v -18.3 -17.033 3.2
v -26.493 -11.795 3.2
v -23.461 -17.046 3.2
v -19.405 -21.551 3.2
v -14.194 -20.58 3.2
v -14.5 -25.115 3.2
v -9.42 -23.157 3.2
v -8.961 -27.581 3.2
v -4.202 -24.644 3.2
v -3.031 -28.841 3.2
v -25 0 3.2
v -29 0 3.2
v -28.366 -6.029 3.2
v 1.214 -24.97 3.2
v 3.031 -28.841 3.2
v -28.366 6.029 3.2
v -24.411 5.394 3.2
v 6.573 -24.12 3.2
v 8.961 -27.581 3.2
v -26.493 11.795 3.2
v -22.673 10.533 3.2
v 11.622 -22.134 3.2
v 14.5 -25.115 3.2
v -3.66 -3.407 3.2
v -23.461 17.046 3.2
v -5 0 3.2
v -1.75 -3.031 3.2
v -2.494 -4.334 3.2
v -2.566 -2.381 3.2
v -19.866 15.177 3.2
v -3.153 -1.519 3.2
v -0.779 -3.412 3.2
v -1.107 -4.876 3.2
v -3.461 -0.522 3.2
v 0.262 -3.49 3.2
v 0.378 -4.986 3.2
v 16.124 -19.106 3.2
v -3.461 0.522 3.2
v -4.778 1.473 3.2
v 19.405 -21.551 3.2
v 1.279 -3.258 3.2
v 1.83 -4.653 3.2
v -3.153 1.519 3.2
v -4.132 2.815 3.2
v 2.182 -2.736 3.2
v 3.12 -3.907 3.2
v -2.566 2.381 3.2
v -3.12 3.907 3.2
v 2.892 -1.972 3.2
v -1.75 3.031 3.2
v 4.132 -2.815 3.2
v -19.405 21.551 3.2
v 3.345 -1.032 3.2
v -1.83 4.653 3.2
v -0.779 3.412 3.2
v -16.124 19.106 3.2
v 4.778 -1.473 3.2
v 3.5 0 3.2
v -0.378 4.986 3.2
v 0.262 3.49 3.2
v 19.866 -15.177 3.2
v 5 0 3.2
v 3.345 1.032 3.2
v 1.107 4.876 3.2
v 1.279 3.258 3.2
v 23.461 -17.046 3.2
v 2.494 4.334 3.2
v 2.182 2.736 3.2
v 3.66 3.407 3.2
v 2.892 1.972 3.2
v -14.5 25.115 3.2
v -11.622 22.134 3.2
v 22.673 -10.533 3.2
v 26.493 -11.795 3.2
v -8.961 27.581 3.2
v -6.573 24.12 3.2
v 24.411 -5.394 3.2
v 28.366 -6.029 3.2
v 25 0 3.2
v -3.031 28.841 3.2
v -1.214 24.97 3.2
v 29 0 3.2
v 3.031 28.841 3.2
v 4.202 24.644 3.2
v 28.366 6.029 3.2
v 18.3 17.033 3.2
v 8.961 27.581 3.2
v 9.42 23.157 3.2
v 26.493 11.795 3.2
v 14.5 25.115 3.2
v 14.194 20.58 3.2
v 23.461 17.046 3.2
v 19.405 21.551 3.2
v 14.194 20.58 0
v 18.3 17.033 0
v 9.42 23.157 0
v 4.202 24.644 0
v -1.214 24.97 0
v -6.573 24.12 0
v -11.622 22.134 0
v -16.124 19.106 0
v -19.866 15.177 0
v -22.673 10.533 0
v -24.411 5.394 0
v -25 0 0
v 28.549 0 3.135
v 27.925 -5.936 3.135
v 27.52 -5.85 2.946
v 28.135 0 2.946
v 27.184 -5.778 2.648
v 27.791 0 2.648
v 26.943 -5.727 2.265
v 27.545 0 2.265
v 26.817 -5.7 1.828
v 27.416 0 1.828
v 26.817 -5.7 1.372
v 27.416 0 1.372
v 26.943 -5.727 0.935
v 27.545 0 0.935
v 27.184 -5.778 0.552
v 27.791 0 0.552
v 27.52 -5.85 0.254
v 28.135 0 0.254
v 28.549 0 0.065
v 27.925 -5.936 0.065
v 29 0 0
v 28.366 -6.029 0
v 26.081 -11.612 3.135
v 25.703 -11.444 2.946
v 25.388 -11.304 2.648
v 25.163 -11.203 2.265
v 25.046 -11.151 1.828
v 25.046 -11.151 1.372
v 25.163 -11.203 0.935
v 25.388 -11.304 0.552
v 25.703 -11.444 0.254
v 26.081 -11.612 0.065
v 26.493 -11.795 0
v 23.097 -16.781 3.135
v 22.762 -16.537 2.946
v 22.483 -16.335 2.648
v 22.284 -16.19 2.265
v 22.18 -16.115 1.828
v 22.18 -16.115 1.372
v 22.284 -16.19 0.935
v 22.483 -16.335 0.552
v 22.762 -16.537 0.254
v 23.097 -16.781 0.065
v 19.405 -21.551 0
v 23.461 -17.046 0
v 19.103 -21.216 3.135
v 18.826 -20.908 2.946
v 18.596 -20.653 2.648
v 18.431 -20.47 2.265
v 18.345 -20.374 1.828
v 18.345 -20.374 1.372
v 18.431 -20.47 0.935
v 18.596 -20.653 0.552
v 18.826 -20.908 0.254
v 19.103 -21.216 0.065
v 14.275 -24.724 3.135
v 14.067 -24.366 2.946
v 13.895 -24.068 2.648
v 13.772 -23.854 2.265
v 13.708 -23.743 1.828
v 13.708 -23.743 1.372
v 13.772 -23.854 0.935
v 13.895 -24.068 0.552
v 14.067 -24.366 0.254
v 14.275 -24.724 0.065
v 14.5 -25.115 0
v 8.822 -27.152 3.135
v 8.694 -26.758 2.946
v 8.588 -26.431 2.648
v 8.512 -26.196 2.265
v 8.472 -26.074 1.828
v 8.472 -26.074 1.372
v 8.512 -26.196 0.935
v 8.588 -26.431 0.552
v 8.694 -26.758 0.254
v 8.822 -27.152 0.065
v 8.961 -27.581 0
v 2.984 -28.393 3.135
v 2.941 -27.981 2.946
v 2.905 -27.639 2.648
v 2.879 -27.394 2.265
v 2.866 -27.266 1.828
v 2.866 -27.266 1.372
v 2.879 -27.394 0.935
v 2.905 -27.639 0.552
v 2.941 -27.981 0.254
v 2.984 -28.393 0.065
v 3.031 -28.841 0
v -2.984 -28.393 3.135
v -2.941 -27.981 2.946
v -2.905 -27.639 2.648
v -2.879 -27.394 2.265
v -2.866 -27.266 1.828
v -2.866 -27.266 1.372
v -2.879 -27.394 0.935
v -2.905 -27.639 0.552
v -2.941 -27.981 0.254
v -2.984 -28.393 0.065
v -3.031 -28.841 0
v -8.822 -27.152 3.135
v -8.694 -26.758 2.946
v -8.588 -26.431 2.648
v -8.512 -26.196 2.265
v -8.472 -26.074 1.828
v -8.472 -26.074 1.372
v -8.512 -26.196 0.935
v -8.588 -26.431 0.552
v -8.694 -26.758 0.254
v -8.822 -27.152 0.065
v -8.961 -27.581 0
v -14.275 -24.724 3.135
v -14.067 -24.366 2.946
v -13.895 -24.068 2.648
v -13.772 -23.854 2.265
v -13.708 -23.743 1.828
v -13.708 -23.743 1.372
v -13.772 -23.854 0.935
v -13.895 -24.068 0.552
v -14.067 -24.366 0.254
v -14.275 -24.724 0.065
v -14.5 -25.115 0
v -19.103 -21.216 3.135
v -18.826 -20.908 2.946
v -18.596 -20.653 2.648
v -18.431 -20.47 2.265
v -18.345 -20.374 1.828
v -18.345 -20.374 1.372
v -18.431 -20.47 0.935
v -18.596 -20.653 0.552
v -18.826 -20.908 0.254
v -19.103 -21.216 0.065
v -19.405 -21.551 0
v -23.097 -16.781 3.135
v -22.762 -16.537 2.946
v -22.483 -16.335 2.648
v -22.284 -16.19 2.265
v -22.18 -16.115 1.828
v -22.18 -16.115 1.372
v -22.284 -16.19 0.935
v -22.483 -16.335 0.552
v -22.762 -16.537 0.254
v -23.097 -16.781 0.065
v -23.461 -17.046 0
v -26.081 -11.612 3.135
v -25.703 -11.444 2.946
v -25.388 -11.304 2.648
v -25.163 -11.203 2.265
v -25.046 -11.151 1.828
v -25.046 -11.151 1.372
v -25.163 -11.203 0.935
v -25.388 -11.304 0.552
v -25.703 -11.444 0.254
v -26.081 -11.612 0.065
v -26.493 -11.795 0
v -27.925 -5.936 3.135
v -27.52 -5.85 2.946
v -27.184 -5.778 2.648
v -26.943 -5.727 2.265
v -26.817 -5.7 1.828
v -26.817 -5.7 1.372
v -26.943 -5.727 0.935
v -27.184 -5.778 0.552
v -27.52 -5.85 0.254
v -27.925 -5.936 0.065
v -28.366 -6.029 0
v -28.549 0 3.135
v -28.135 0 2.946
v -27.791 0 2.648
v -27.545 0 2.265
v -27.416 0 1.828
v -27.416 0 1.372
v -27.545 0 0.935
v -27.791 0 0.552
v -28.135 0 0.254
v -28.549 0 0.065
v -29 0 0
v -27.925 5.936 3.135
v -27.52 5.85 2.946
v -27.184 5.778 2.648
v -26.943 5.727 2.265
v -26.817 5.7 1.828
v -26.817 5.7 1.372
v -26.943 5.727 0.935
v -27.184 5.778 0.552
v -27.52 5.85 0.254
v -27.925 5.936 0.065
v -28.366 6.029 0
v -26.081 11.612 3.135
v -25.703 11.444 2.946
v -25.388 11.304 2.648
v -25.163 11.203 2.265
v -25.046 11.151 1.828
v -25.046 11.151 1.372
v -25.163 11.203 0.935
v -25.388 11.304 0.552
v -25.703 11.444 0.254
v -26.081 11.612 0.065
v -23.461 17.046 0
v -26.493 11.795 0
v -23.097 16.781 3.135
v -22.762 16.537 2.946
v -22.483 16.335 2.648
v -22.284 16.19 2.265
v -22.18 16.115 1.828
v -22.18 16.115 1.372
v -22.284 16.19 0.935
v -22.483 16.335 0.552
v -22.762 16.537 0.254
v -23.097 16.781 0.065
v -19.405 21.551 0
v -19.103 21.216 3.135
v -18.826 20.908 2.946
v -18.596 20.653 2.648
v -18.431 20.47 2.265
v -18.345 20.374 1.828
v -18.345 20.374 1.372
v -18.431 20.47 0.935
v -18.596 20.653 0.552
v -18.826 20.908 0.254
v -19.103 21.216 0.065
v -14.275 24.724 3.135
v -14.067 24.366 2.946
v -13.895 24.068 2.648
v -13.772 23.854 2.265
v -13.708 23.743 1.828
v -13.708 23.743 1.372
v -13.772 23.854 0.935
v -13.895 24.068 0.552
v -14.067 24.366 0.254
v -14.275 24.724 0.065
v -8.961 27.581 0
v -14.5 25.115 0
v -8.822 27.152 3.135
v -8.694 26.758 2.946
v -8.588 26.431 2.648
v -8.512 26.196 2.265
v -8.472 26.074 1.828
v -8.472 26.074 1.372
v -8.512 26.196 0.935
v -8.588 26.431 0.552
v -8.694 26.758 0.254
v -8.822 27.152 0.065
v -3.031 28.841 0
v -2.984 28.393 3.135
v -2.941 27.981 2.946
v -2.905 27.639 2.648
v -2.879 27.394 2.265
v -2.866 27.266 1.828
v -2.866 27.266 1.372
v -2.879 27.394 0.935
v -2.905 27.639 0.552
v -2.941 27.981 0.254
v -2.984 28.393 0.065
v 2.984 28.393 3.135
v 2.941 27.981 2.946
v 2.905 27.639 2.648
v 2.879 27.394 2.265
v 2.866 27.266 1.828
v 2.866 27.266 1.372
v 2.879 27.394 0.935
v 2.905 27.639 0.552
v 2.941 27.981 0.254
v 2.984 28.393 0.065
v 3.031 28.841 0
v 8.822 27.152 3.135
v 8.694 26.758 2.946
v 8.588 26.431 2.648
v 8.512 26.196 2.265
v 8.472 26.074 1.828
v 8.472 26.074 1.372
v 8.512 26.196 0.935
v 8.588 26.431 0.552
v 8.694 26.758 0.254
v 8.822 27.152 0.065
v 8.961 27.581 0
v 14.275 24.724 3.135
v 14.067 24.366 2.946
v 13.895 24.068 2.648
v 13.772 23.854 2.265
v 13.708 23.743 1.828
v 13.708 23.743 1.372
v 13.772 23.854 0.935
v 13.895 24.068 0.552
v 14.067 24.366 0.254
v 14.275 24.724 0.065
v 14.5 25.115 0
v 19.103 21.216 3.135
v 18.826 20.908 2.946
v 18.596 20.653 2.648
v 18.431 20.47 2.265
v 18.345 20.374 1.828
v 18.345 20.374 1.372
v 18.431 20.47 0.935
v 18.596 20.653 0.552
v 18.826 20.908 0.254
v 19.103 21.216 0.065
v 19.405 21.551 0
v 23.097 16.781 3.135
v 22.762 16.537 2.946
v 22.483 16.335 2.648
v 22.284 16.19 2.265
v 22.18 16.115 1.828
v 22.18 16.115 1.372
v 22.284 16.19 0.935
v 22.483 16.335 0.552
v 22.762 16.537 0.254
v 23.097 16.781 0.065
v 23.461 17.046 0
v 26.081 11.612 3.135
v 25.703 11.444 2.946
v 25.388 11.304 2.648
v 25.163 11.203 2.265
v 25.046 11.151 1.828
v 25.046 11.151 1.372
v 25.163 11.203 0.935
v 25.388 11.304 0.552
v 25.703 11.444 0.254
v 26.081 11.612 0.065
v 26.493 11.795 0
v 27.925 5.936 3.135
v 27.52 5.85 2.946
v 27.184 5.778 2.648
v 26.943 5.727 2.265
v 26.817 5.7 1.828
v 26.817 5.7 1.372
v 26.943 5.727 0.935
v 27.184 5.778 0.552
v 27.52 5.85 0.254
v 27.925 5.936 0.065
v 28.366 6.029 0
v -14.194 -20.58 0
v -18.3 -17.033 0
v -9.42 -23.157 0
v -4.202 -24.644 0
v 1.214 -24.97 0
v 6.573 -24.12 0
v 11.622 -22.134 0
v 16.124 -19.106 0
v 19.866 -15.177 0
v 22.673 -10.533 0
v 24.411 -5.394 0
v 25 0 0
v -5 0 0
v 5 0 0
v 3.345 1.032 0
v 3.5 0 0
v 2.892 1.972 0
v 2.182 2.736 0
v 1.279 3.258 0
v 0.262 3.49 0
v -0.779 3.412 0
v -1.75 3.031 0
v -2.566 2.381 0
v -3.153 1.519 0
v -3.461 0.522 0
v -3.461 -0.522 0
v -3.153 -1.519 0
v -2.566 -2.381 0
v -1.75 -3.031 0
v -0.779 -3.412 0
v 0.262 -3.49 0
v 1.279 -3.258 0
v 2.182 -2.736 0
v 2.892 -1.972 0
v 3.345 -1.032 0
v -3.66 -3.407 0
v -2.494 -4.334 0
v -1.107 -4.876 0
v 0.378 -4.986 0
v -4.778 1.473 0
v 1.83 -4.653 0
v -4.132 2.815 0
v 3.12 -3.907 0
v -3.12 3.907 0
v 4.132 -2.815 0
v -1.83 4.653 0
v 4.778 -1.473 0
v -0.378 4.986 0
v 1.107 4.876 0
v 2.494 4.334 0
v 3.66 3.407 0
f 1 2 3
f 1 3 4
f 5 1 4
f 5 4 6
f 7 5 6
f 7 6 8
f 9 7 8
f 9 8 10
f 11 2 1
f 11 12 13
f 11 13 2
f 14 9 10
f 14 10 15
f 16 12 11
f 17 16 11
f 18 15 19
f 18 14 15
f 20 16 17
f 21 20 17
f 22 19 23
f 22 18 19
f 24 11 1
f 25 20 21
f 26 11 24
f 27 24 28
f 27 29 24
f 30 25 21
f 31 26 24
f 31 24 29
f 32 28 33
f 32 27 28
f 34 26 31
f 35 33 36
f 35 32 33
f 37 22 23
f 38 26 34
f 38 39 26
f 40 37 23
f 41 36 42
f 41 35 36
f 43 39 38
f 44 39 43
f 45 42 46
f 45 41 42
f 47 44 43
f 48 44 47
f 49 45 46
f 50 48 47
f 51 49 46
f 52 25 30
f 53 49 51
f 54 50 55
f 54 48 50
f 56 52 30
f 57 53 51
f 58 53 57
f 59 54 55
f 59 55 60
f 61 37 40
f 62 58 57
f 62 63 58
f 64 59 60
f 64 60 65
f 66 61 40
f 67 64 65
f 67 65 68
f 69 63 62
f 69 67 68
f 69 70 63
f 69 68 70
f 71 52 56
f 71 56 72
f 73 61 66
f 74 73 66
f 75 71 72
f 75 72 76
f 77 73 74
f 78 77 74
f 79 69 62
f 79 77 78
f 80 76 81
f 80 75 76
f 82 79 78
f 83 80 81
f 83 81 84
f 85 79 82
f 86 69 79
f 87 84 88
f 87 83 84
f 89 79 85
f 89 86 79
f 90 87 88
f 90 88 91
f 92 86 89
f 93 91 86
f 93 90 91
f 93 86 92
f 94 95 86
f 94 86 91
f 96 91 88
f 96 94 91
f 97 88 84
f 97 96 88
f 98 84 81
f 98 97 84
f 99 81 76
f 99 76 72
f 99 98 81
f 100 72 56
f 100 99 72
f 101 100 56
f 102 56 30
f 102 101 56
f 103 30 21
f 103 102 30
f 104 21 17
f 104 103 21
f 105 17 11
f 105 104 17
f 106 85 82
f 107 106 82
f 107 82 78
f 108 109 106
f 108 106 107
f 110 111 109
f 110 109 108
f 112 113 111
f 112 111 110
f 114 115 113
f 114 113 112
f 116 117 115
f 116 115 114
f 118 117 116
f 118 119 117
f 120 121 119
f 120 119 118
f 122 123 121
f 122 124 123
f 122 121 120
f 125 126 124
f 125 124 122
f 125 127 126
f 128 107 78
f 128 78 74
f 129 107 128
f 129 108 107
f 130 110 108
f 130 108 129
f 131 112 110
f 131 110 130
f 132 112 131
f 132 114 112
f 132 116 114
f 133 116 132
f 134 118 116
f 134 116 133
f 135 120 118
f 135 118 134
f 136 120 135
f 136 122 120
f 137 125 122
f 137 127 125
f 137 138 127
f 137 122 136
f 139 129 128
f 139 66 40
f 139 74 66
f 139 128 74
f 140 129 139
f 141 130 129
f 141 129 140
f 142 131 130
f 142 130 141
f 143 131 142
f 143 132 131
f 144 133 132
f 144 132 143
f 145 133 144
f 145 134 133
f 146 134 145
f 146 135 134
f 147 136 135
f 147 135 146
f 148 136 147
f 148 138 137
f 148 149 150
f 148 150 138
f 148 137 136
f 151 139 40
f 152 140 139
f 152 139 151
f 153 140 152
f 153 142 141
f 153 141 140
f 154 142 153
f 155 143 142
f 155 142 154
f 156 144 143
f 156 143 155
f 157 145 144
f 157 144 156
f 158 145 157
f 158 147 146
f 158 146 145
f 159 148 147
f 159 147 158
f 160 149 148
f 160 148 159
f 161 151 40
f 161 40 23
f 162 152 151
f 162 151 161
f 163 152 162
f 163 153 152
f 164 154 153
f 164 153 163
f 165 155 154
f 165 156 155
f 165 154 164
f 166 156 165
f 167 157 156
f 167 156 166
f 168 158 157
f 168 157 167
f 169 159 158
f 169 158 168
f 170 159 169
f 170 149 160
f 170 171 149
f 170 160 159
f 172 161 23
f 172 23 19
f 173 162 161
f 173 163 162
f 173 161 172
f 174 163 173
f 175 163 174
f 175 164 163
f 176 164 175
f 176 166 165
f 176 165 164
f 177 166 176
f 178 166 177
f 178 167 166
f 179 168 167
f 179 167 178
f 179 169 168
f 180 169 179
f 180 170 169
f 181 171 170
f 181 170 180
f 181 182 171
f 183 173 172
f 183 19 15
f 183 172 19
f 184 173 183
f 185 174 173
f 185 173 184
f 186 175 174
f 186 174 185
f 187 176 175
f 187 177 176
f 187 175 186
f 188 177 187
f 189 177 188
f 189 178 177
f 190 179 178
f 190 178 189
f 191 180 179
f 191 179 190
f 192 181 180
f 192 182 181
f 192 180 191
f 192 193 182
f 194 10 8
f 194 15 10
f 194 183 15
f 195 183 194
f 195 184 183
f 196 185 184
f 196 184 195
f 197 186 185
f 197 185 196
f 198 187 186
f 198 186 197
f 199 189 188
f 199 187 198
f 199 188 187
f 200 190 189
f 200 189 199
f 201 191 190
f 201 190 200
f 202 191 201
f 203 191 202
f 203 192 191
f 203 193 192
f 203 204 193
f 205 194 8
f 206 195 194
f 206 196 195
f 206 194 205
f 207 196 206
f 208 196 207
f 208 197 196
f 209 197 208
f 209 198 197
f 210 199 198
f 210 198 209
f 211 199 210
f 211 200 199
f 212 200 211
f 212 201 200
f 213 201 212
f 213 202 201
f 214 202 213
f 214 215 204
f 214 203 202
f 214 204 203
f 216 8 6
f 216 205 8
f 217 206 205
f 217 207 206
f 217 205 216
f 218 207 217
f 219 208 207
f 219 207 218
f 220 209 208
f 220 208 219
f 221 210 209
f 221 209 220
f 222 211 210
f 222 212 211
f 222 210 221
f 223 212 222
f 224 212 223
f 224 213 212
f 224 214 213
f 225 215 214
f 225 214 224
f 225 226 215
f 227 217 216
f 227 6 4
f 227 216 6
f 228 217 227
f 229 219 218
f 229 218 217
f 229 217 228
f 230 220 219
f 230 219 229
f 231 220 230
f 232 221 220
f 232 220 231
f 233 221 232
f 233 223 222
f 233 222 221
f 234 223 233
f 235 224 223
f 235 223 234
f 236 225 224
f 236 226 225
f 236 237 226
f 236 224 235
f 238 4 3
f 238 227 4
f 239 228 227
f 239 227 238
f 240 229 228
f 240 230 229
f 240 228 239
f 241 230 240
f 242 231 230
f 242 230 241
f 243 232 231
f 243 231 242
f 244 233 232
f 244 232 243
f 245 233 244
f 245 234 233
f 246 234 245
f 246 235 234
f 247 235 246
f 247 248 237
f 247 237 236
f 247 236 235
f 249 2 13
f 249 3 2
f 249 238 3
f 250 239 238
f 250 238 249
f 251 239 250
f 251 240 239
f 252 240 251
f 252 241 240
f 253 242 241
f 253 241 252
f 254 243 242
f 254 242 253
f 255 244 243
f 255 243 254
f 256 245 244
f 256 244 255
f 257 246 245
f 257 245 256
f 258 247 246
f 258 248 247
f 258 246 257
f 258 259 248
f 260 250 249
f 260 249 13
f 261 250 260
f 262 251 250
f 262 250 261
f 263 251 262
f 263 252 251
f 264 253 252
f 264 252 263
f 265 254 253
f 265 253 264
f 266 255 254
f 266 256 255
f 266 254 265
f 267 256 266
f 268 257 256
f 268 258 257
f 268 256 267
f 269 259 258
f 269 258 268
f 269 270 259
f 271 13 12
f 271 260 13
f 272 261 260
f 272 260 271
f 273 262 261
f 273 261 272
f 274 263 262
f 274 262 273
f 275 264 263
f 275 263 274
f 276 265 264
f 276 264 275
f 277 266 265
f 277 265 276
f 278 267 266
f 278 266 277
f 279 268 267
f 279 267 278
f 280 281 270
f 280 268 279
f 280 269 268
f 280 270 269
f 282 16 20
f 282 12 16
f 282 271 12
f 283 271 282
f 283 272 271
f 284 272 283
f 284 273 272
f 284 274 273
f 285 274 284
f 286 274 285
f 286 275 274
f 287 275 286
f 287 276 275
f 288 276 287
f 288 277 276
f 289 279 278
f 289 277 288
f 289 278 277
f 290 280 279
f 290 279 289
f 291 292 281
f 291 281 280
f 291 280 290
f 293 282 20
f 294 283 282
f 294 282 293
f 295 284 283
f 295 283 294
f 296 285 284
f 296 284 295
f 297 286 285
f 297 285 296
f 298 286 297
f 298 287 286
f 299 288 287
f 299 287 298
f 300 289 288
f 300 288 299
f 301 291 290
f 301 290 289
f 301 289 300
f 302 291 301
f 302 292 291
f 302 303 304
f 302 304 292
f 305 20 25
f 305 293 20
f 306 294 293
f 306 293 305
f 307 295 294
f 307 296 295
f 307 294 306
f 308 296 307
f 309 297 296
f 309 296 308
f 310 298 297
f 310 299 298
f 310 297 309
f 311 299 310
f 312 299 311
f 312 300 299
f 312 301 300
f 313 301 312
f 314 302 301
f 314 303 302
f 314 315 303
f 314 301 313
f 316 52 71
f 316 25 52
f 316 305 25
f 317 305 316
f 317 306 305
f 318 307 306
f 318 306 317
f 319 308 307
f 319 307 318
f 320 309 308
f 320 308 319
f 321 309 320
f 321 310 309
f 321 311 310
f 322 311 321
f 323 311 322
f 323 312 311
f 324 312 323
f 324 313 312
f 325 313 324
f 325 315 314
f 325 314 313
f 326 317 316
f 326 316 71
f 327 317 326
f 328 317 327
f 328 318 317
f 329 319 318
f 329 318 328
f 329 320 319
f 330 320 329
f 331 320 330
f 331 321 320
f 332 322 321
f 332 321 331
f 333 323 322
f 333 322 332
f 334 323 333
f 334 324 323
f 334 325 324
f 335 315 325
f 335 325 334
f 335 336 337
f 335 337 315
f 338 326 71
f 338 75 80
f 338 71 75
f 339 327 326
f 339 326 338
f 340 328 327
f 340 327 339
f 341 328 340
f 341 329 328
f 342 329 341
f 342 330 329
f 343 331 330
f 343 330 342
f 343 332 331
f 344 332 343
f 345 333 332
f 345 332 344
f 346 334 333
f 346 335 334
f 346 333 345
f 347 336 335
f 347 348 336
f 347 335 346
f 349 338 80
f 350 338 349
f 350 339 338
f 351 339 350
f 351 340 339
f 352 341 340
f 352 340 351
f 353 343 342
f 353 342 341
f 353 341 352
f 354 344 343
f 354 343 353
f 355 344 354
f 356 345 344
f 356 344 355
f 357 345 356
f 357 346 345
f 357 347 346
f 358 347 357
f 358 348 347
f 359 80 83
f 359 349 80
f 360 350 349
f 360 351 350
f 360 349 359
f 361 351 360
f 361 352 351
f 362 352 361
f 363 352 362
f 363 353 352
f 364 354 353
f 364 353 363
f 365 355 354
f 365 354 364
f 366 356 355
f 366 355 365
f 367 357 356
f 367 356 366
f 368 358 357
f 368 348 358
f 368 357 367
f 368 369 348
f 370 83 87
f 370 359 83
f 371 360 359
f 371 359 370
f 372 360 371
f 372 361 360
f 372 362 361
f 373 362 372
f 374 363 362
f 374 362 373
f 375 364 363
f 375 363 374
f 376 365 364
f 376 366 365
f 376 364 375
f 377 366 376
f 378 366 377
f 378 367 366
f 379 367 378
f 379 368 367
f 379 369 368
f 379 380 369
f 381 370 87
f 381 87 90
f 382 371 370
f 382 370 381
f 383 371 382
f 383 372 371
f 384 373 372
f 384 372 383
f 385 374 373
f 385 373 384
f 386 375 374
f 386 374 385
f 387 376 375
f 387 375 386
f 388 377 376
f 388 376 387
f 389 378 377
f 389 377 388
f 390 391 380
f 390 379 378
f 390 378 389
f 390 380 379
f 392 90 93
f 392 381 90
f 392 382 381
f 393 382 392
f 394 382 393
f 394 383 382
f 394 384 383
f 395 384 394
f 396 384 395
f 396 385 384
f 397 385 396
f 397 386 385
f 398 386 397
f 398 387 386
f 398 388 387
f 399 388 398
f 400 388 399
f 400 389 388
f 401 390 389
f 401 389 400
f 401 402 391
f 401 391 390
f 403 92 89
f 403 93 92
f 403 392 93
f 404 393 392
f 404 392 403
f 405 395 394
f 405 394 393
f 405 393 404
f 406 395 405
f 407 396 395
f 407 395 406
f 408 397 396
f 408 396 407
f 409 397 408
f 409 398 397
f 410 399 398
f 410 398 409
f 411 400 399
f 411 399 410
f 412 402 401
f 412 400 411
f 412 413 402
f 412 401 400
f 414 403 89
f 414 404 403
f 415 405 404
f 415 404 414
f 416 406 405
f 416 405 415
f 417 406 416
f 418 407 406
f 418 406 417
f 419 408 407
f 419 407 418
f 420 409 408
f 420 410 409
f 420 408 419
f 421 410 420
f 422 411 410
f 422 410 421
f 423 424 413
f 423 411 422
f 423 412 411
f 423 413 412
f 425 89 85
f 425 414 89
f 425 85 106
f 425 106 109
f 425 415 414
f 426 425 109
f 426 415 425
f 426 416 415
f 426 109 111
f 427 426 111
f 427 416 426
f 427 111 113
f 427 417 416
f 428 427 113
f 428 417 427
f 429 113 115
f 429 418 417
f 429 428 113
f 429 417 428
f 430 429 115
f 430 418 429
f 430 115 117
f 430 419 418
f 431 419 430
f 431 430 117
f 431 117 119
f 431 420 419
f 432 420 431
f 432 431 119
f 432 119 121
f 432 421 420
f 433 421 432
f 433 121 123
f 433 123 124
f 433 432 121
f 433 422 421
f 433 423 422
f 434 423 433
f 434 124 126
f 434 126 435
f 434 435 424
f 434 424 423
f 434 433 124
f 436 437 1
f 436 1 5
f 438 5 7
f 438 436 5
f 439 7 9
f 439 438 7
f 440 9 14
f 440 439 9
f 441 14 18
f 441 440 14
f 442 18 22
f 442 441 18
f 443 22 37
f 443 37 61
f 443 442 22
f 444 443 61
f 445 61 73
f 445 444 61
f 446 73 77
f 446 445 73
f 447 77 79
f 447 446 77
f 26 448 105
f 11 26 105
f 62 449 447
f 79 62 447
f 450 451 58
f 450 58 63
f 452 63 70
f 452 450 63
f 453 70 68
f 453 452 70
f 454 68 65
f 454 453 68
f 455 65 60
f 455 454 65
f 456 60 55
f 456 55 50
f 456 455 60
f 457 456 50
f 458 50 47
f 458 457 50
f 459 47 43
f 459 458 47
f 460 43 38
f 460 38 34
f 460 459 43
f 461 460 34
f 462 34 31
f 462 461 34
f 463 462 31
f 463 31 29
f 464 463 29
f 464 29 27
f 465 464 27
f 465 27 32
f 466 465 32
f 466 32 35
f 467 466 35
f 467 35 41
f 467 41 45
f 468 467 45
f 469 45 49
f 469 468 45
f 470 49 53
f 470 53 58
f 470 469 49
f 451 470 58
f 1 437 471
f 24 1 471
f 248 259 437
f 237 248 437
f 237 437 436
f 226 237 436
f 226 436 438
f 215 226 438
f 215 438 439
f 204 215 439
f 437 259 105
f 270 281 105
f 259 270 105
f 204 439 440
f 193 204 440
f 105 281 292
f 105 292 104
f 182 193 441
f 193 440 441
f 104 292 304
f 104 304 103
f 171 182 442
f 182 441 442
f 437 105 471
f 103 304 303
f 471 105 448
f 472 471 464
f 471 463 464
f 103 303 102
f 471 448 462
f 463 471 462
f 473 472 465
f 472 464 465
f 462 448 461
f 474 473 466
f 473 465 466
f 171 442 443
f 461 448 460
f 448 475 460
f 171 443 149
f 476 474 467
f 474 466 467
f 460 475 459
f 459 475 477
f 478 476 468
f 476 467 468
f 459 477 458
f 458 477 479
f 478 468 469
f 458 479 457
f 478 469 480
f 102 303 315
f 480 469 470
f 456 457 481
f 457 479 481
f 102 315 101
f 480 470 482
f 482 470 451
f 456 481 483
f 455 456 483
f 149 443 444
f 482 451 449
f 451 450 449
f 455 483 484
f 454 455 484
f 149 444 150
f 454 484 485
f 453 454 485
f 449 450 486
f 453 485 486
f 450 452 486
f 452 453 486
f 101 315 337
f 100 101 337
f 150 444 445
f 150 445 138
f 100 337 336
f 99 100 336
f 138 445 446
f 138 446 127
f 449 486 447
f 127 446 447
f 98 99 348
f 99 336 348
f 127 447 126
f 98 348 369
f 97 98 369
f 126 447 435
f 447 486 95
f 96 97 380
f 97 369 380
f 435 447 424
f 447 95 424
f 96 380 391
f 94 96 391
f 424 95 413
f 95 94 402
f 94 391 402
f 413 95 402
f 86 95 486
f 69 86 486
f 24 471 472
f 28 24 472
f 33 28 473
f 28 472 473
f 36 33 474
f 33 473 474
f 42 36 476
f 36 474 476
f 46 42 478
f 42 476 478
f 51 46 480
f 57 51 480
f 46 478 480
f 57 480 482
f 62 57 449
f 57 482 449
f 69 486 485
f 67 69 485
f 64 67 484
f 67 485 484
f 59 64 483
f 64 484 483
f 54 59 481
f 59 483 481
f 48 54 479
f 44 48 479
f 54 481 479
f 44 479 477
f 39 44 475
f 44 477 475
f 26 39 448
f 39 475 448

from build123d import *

# Parameters (mm, degrees)
SKETCH1_R           = 29
SKETCH1_R_2         = 25
SKETCH1_R_3         = 5
SKETCH1_R_4         = 3.5
BOSS_EXTRUDE3_DEPTH = 3.2


with BuildPart() as part:
    # Sketch1 → Boss-Extrude3 (new body)
    # profile 1 of 4: a face of its own
    with BuildSketch(Plane.XY):
        Circle(SKETCH1_R)
        Circle(SKETCH1_R_2, mode=Mode.SUBTRACT)
    # profile 2 of 4: a face of its own
    with BuildSketch(Plane.XY):
        with BuildLine():
            Line((18.29985715, 17.032769249), (3.65997143, 3.40655385))
            ThreePointArc((3.65997143, 3.40655385), (4.652948374, 1.830320034), (5, 0))
            Line((5, 0), (25, 0))
            ThreePointArc((25, 0), (23.264741872, 9.151600168), (18.29985715, 17.032769249))
        make_face()
    # profile 3 of 4: a face of its own
    with BuildSketch(Plane.XY):
        with BuildLine():
            ThreePointArc((-3.65997143, -3.40655385), (-4.652948374, -1.830320034), (-5, 0))
            Line((-5, 0), (-25, 0))
            ThreePointArc((-25, 0), (-23.264741872, -9.151600168), (-18.29985715, -17.032769249))
            Line((-18.29985715, -17.032769249), (-3.65997143, -3.40655385))
        make_face()
    # profile 4 of 4: a face of its own
    with BuildSketch(Plane.XY):
        Circle(SKETCH1_R_3)
        Circle(SKETCH1_R_4, mode=Mode.SUBTRACT)
    extrude(amount=BOSS_EXTRUDE3_DEPTH)

    # Sketch6 → Cut-Revolve4 (revolve, cut)
    with BuildSketch(Plane(origin=(0, 0, 0), x_dir=(0, 0, -1), z_dir=(1, 0, 0)), mode=Mode.PRIVATE) as cut_revolve4_sk:
        with BuildLine():
            Line((0, 29), (-3.2, 29))
            ThreePointArc((-3.2, 29), (-1.6, 27.4), (0, 29))
        make_face()
    revolve(cut_revolve4_sk.sketch.rotate(Axis((0, 0, 3.2), (0, 0, -1)), 90), axis=Axis((0, 0, 3.2), (0, 0, -1)), mode=Mode.SUBTRACT)


solid = part.part
